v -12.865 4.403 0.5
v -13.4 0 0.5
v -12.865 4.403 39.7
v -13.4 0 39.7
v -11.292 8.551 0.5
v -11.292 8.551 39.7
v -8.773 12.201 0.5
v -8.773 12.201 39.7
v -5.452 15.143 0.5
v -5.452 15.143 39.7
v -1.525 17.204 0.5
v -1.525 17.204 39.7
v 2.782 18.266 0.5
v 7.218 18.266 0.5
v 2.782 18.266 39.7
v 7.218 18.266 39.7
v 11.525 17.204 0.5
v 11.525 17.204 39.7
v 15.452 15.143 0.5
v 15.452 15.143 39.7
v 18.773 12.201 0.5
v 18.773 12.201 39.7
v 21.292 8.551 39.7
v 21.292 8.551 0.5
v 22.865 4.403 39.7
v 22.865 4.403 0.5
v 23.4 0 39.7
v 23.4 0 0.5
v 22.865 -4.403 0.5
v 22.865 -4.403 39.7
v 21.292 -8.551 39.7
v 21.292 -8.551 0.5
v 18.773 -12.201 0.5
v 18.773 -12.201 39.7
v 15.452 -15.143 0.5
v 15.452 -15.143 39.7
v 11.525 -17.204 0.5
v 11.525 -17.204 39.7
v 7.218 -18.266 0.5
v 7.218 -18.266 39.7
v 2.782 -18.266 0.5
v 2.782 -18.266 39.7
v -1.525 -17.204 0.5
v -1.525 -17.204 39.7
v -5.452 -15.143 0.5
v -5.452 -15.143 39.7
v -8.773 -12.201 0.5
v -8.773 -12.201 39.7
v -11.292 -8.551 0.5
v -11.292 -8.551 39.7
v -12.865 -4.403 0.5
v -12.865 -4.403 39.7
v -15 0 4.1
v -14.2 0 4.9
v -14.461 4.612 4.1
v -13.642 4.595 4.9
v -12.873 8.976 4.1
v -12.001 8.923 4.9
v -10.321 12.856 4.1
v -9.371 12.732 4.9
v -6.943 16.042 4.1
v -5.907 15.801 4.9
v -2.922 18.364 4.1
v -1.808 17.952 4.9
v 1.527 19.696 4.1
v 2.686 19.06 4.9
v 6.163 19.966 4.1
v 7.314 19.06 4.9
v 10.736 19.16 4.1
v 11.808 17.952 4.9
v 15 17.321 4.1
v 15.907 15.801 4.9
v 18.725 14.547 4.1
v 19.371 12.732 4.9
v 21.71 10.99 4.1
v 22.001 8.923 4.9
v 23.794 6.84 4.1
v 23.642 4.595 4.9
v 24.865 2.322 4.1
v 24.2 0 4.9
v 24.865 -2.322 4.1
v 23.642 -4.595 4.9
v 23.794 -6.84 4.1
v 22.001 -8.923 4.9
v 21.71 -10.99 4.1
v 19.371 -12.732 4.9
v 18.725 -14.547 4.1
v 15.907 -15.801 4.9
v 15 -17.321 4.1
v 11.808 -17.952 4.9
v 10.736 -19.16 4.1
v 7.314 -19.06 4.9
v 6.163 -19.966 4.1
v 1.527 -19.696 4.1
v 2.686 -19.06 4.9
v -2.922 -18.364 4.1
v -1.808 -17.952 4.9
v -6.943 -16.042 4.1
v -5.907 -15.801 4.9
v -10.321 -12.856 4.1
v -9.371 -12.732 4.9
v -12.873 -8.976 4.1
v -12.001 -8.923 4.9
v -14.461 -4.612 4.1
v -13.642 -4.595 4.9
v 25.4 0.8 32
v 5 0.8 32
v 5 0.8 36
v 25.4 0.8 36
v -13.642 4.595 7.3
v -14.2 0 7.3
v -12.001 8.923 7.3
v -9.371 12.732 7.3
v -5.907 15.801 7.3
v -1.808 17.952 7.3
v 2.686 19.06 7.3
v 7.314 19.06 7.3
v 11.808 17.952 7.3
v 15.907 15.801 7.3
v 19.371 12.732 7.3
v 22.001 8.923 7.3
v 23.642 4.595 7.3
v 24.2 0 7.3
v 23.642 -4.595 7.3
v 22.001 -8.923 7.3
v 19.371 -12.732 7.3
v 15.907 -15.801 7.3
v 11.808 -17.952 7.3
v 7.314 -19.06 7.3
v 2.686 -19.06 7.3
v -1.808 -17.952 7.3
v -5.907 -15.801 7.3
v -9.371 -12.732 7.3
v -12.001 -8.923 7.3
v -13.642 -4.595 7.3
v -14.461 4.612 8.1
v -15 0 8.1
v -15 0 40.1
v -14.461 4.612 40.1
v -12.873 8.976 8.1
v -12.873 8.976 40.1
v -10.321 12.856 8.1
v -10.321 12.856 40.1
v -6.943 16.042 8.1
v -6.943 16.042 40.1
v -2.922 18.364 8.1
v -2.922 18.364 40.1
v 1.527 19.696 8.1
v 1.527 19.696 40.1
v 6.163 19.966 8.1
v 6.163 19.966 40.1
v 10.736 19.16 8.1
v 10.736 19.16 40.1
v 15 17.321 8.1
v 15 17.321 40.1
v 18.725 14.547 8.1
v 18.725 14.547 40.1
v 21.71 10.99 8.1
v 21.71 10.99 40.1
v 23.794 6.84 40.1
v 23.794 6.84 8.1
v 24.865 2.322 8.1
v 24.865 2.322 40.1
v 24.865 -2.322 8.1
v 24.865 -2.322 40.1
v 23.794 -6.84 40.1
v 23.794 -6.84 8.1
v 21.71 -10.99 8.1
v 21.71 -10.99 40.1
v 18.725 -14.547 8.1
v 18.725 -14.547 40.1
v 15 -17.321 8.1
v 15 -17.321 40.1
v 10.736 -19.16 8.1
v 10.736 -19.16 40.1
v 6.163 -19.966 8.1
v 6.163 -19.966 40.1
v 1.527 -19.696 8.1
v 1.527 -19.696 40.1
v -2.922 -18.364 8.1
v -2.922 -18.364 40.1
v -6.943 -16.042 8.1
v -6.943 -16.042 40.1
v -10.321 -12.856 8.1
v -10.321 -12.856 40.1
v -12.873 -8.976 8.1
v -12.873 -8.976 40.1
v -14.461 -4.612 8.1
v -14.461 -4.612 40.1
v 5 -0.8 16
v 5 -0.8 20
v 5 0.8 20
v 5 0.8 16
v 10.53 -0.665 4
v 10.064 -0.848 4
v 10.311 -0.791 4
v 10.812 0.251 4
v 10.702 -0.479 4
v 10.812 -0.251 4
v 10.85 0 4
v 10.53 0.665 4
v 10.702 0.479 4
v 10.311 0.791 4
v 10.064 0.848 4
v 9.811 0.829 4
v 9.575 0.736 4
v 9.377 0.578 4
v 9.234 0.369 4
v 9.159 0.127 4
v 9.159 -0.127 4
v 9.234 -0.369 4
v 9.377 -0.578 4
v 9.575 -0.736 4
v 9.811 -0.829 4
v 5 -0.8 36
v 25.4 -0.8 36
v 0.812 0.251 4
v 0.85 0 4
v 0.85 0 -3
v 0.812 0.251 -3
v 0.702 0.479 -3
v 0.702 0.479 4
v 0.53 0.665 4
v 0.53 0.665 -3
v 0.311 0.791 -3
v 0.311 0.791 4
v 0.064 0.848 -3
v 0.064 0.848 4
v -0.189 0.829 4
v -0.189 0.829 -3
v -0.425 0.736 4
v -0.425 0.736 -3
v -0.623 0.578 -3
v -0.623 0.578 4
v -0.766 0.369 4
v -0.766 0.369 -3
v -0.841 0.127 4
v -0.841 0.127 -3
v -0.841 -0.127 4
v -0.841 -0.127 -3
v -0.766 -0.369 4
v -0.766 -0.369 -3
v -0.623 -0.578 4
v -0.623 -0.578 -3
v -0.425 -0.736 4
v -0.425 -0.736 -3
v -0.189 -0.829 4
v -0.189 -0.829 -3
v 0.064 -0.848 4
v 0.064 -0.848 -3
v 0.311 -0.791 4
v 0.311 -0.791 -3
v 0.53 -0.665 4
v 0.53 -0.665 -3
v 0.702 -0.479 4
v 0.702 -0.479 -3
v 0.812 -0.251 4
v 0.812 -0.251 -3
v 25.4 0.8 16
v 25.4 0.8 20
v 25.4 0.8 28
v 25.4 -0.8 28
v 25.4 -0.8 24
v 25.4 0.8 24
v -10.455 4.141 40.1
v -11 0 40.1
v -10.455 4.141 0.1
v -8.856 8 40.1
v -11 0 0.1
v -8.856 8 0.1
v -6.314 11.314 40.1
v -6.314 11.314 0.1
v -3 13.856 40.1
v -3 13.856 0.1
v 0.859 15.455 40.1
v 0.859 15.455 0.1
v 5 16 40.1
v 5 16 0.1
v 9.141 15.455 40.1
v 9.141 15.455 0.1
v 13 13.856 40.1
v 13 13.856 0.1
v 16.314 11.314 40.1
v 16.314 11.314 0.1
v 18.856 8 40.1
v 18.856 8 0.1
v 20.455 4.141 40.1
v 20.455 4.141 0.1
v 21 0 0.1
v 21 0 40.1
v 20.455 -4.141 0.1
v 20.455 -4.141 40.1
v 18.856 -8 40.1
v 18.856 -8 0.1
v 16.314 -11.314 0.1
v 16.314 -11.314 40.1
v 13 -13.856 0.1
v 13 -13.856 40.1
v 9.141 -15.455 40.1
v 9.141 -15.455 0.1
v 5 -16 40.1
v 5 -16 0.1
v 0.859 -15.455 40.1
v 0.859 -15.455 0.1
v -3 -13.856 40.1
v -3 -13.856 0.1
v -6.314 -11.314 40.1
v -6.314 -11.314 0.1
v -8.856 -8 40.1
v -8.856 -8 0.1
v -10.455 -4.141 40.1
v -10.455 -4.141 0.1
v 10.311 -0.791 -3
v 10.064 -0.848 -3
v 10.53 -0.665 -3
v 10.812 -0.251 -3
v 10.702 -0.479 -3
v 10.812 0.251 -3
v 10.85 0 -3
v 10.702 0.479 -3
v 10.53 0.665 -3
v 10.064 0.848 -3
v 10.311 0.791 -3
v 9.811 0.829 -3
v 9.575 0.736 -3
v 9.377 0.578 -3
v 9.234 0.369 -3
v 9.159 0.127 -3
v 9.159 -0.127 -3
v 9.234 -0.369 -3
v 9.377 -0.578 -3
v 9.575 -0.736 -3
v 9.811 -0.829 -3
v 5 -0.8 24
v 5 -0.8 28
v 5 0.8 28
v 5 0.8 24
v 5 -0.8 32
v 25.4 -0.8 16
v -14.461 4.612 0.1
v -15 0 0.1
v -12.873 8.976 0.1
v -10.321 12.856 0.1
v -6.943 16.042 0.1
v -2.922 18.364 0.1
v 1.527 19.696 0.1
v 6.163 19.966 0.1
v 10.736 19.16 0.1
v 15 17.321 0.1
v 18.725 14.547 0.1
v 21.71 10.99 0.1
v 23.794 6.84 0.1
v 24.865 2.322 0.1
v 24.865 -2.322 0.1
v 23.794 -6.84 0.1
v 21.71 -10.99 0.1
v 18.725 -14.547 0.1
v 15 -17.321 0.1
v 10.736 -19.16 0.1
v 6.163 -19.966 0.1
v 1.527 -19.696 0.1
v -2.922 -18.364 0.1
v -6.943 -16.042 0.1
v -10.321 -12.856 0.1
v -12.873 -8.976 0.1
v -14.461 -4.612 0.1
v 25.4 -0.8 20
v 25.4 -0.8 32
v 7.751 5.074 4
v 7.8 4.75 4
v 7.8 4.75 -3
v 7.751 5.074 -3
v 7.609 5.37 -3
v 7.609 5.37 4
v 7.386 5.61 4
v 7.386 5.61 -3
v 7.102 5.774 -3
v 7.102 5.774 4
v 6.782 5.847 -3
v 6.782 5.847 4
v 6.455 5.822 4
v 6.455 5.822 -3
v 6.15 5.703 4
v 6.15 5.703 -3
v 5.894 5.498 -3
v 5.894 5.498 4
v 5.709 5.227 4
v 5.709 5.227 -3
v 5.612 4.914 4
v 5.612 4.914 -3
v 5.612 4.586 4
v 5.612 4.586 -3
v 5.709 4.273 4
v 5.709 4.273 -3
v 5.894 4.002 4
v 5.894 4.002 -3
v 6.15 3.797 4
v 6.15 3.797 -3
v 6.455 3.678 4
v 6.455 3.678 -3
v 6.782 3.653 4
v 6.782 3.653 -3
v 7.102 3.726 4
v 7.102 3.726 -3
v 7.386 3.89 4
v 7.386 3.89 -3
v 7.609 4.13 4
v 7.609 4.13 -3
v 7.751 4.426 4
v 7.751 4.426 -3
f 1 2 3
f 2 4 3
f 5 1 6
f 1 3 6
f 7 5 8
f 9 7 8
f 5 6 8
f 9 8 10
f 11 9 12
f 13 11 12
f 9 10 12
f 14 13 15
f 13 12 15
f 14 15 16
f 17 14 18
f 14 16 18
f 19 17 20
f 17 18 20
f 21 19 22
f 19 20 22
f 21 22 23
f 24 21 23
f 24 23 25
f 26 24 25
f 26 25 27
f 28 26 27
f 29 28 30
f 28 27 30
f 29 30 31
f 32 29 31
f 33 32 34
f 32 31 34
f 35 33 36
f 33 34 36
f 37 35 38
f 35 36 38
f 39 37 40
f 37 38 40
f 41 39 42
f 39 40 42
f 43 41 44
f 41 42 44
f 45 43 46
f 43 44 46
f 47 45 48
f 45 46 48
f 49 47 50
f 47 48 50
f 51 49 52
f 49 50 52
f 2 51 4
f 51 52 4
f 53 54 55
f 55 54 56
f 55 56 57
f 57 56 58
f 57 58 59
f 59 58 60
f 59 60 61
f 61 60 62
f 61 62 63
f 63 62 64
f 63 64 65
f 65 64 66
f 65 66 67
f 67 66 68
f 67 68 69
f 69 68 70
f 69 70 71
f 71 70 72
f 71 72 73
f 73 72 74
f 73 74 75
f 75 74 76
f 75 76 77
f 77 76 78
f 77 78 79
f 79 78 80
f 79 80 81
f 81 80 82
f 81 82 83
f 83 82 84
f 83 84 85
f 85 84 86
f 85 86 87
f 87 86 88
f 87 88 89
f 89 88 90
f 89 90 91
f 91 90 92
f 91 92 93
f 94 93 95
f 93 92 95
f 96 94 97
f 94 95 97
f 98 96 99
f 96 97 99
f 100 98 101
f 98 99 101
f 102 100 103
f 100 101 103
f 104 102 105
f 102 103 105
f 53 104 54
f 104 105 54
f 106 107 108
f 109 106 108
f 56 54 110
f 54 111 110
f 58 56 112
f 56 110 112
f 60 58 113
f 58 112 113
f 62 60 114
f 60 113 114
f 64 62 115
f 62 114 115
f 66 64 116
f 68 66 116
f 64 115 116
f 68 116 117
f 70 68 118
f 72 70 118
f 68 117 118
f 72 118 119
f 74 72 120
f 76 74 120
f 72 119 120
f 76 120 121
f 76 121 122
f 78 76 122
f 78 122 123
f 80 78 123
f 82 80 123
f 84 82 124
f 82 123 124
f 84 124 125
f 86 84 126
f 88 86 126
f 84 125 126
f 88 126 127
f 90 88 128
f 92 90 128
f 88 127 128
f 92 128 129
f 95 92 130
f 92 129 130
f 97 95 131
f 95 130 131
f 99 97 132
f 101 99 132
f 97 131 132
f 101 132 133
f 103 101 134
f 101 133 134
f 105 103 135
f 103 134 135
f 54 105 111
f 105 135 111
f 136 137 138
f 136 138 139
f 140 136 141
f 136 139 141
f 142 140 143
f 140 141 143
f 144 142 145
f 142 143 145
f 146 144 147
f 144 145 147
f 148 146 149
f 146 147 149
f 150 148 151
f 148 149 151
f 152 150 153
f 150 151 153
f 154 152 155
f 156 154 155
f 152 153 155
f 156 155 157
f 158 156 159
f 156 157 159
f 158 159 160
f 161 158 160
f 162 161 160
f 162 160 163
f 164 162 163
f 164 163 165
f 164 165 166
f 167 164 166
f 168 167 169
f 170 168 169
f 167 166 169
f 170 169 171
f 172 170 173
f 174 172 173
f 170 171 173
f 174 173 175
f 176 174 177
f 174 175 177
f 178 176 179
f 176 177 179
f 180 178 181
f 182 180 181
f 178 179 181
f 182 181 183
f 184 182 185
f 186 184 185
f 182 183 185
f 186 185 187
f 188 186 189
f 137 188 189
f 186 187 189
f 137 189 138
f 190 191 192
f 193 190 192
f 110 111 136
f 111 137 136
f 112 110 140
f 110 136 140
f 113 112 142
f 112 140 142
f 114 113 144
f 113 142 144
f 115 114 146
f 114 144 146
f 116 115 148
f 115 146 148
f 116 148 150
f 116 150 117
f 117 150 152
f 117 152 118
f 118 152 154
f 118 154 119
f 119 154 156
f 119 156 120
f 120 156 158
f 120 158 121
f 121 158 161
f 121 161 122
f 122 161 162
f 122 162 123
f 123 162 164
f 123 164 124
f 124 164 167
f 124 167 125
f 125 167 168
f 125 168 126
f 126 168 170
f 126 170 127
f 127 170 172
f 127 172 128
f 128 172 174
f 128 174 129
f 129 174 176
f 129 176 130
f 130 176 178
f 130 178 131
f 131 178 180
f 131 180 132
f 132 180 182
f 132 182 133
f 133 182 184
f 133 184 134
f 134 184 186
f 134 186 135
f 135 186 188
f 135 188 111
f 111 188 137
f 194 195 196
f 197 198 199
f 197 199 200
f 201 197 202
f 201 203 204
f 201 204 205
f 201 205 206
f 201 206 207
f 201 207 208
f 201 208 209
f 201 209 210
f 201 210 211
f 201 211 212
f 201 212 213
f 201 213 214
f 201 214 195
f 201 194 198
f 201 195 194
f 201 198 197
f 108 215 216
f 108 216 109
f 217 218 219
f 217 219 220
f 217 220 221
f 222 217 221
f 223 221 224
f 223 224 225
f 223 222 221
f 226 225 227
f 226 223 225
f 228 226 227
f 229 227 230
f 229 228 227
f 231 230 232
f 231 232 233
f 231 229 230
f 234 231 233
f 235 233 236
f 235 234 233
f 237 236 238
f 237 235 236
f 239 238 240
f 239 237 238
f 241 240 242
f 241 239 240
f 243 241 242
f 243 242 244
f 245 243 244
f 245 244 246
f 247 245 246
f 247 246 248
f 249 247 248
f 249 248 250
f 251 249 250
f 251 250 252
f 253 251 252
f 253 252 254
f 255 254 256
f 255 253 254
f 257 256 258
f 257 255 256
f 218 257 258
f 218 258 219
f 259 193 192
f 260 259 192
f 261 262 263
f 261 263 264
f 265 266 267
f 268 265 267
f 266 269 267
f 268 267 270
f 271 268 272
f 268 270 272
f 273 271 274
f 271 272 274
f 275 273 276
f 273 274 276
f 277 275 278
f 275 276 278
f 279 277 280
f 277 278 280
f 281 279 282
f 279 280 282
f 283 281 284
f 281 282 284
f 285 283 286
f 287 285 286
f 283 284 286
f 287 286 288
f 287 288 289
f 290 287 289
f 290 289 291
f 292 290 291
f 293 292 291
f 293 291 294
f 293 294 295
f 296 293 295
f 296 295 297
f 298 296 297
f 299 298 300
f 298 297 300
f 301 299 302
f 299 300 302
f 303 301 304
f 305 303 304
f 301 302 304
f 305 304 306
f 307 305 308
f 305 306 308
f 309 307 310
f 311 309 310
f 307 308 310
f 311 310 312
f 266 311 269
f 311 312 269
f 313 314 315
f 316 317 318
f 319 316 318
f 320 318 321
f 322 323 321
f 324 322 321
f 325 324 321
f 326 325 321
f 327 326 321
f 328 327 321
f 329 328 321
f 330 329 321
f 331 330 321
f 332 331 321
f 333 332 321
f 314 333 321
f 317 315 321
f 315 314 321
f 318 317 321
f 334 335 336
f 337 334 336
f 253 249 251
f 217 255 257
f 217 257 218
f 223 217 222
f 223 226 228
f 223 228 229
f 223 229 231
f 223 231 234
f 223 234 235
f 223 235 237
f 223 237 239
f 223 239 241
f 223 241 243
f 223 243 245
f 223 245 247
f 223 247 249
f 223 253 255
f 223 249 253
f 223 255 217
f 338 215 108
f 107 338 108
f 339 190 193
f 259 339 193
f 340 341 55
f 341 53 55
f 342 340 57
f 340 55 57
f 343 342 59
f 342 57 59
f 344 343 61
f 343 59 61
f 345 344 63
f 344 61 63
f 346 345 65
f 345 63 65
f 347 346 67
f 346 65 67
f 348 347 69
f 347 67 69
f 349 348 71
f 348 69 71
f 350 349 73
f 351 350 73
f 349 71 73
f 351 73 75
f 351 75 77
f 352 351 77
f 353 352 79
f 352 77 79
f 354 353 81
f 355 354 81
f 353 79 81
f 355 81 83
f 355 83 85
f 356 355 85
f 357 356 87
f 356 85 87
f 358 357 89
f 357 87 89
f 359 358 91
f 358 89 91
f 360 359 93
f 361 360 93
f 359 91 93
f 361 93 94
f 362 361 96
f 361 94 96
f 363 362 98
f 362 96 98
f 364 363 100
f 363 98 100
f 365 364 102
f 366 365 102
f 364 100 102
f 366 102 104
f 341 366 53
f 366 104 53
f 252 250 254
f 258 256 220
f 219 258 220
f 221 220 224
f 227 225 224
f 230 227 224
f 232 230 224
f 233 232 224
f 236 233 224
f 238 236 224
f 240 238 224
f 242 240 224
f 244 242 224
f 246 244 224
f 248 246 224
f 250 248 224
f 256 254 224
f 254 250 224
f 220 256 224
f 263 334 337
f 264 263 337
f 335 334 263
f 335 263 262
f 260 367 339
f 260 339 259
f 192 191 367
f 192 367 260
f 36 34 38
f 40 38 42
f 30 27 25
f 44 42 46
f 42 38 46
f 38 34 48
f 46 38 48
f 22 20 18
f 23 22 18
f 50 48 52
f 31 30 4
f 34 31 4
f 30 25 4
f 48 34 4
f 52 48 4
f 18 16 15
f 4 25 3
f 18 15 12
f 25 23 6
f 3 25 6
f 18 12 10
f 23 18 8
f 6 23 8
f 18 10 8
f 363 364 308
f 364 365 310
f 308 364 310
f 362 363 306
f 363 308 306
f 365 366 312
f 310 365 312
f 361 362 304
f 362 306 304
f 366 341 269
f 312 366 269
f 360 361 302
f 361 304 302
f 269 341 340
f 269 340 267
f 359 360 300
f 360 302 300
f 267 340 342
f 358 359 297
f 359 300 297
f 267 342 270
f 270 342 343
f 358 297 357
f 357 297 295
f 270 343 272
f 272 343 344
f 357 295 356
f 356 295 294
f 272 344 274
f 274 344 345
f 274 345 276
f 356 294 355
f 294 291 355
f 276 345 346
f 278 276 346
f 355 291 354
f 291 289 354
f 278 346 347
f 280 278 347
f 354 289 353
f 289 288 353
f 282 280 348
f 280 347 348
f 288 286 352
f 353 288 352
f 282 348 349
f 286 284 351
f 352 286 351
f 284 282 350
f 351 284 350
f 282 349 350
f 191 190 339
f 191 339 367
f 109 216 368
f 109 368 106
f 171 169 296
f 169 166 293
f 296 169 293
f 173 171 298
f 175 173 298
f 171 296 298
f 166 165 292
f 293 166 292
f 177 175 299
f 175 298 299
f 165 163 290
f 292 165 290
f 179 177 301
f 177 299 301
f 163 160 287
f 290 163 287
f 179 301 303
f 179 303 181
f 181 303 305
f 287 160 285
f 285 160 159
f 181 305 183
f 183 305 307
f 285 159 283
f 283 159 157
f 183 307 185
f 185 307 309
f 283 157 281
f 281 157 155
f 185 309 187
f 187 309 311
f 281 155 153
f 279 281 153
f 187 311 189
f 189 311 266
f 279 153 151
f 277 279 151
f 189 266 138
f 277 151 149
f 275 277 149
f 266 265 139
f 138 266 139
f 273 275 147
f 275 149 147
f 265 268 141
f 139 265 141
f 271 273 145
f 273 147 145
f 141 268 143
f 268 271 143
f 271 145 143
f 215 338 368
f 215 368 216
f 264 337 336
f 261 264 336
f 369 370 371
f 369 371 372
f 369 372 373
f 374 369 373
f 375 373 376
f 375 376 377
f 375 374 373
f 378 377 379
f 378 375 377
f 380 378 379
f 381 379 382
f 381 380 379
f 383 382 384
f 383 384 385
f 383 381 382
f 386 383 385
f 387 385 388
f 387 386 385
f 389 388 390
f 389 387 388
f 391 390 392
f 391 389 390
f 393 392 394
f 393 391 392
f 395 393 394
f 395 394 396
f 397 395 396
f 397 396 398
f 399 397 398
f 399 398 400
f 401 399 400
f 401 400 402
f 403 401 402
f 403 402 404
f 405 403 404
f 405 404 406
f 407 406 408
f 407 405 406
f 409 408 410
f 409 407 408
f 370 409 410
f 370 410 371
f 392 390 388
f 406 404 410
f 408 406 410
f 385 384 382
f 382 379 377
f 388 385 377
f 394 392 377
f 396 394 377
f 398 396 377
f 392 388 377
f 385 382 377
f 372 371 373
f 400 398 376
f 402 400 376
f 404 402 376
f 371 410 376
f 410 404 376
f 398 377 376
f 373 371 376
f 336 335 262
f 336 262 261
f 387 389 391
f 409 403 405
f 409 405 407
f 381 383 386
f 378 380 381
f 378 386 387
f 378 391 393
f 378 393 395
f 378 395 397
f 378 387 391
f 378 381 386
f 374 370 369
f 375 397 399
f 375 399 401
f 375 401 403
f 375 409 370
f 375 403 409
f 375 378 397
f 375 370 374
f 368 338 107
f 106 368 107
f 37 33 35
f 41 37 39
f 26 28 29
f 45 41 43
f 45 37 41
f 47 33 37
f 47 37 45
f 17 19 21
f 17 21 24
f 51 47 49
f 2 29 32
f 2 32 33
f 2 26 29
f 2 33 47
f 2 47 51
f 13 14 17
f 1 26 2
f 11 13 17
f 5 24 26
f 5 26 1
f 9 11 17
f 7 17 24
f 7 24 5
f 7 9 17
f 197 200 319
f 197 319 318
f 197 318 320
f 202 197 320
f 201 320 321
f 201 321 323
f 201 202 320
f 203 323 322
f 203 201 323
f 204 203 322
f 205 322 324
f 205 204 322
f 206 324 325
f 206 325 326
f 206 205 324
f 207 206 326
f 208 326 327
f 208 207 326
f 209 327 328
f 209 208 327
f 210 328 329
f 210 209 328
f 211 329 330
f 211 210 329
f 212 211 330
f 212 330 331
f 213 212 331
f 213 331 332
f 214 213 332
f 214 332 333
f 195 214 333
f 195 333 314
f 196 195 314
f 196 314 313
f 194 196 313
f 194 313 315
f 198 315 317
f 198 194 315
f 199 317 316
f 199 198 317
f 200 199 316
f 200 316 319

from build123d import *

# Parameters (mm, degrees)
SKETCH002_W   = 18.4
SKETCH002_H   = 39.2
SKETCH003_R   = 0.85
SKETCH003_R_2 = 1.1
PAD_DEPTH     = 7
SKETCH004_W   = 1.6
SKETCH004_H   = 4
PAD001_DEPTH  = 20.4


with BuildPart() as revolution:
    # Sketch → Revolution (revolve)
    with BuildSketch(Plane.XZ):
        Polygon((-15, 0.1), (-15, 4.1), (-14.2, 4.9), (-14.2, 7.3), (-15, 8.1), (-15, 40.1), (-11, 40.1), (-11, 0.1), align=None)
    revolve(axis=Axis((5, 0, 7.548619), (0, 0, -1)))


with BuildPart() as revolution001:
    # Sketch002 → Revolution001 (revolve)
    with BuildSketch(Plane.XZ):
        with Locations((-4.2, 20.1)):
            Rectangle(SKETCH002_W, SKETCH002_H)
    revolve(axis=Axis((5, 0, 4.680116), (0, 0, -1)))


with BuildPart() as pad:
    # Sketch003 → Pad (new body)
    with BuildSketch(Plane.XY.offset(4)):
        Circle(SKETCH003_R)
        with Locations((10, 0)):
            Circle(SKETCH003_R)
        with Locations((6.7, 4.75)):
            Circle(SKETCH003_R_2)
    extrude(amount=-PAD_DEPTH)


with BuildPart() as pad001:
    # Sketch004 → Pad001 (new body)
    with BuildSketch(Plane.YZ.offset(5)):
        with Locations((0, 18)):
            Rectangle(SKETCH004_W, SKETCH004_H)
        with Locations((0, 26)):
            Rectangle(SKETCH004_W, SKETCH004_H)
        with Locations((0, 34)):
            Rectangle(SKETCH004_W, SKETCH004_H)
    extrude(amount=PAD001_DEPTH)


solid = Compound([revolution.part, revolution001.part, pad.part, pad001.part])
